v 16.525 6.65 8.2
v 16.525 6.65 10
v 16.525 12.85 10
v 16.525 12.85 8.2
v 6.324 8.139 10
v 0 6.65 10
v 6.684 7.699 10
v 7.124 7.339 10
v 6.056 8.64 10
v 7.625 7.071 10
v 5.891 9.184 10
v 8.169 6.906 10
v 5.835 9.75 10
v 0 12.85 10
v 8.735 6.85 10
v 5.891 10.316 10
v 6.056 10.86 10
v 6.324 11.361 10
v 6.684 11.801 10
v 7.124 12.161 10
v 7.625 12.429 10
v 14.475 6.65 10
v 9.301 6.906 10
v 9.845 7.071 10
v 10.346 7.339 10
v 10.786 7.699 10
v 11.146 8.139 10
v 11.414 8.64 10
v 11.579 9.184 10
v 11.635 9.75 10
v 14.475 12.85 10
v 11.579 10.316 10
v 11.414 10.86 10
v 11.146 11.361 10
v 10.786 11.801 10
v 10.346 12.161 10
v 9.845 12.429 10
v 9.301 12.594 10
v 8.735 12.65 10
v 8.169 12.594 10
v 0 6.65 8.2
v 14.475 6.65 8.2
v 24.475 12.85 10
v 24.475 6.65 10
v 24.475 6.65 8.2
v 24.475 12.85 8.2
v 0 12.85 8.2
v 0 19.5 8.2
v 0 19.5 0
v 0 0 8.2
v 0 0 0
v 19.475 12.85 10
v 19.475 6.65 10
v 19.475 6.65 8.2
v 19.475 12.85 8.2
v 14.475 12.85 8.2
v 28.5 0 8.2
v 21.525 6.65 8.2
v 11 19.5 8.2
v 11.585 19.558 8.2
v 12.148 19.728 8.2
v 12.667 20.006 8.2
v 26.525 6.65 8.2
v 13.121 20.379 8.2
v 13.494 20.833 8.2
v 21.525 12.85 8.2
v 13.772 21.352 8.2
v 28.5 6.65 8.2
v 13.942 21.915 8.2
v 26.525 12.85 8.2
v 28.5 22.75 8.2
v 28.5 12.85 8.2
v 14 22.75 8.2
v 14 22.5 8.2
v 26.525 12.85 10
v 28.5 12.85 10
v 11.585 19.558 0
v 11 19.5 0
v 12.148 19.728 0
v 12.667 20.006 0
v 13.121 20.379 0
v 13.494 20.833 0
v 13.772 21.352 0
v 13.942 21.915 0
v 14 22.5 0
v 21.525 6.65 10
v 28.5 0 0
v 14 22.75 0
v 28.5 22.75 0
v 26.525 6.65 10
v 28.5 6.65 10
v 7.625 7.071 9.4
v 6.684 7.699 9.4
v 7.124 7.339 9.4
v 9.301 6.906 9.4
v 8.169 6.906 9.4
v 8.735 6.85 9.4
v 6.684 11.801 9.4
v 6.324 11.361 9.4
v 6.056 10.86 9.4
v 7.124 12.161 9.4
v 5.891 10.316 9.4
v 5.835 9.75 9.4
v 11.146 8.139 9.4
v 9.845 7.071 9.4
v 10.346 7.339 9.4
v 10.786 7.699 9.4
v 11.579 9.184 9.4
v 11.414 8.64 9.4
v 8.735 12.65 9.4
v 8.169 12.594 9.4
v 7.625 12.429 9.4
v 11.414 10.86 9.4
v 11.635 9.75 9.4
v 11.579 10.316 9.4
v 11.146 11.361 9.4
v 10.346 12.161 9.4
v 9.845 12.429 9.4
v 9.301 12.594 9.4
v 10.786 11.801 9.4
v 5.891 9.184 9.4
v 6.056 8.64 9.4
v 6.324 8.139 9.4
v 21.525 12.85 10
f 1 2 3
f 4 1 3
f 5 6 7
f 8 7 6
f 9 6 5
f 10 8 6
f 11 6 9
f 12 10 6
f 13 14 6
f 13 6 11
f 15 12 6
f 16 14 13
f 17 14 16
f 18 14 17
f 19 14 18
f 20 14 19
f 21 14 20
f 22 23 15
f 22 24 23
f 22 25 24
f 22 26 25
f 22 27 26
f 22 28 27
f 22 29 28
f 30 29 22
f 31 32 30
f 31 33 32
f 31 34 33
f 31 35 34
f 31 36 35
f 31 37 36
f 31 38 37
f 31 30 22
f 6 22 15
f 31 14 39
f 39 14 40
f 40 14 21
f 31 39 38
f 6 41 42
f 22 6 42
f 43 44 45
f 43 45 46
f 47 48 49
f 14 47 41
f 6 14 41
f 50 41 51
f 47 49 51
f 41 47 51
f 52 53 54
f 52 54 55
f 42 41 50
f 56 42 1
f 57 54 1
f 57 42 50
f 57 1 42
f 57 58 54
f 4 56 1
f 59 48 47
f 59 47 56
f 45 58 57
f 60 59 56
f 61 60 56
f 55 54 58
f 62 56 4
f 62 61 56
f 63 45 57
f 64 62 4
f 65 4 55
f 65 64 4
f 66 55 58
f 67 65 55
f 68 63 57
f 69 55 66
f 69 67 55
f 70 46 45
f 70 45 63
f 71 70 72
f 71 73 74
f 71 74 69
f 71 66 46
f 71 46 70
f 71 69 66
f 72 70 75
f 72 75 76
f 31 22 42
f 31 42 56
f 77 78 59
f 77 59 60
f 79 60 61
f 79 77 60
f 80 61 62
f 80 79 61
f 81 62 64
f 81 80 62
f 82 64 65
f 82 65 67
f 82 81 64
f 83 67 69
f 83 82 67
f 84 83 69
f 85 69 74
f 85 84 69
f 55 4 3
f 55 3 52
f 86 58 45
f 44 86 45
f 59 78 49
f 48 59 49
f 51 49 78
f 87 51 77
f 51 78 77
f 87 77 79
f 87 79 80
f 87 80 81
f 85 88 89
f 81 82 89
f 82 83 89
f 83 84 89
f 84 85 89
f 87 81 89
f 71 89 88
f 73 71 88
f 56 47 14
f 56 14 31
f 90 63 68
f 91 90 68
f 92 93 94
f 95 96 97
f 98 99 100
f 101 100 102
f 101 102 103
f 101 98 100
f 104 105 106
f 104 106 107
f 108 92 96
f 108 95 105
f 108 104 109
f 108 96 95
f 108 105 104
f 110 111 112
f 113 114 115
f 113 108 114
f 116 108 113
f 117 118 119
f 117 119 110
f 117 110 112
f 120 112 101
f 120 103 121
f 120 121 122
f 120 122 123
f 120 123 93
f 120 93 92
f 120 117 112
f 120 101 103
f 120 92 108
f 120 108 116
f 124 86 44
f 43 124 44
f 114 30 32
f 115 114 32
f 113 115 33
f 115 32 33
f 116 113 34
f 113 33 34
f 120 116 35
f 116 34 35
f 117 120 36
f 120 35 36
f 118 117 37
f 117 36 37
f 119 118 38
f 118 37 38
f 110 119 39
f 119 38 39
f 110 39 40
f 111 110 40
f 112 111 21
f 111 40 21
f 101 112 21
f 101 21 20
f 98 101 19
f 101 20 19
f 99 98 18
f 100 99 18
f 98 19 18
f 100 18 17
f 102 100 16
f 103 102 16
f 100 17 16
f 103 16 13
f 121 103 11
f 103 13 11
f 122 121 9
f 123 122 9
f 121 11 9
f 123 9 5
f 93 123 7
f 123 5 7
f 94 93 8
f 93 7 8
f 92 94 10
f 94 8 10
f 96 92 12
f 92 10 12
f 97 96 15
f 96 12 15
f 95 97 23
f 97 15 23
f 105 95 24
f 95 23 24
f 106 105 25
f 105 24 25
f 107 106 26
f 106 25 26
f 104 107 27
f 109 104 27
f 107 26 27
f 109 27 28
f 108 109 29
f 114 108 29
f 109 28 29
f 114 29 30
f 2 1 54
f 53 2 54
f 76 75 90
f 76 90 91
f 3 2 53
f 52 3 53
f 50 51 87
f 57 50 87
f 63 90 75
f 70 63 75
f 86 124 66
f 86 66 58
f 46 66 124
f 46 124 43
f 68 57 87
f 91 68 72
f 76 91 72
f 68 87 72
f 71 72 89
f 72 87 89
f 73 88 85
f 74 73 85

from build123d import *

# Parameters (mm, degrees)
PAD004_DEPTH    = 8.2
SKETCH014_W     = 28.5
SKETCH014_H     = 6.2
PAD005_DEPTH    = 1.8
SKETCH015_R     = 2.9
POCKET004_DEPTH = 0.6
SKETCH016_W     = 2.05
SKETCH016_H     = 6.2
POCKET005_DEPTH = 1.8


with BuildPart() as part:
    # Sketch013 → Pad004 (new body)
    with BuildSketch(Plane.XY):
        with BuildLine():
            Line((0, 0), (28.5, 0))
            Line((28.5, 0), (28.5, 22.75))
            Line((28.5, 22.75), (14, 22.75))
            Line((14, 22.75), (14, 22.5))
            ThreePointArc((11, 19.5), (13.12132, 20.37868), (14, 22.5))
            Line((11, 19.5), (0, 19.5))
            Line((0, 19.5), (0, 0))
        make_face()
    extrude(amount=PAD004_DEPTH)

    # Sketch014 (on Face9 of Pad004) → Pad005 (join)
    with BuildSketch(Plane.XY.offset(8.2)):
        with Locations((14.25, 9.75)):
            Rectangle(SKETCH014_W, SKETCH014_H)
    extrude(amount=PAD005_DEPTH)

    # Sketch015 (on Face11 of Pad005) → Pocket004 (cut)
    with BuildSketch(Plane.XY.offset(10)):
        with Locations((8.735056, 9.75)):
            Circle(SKETCH015_R)
    extrude(amount=-POCKET004_DEPTH, mode=Mode.SUBTRACT)

    # Sketch016 (on Face10 of Pocket004) → Pocket005 (cut)
    with BuildSketch(Plane.XY.offset(10)):
        with Locations((15.5, 9.75)):
            Rectangle(SKETCH016_W, SKETCH016_H)
        Polygon((21.525, 12.85), (21.525, 6.65), (19.475, 6.65), (19.475, 12.85), (20.5, 12.85), align=None)
        with Locations((25.5, 9.75)):
            Rectangle(SKETCH016_W, SKETCH016_H)
    extrude(amount=-POCKET005_DEPTH, mode=Mode.SUBTRACT)


solid = part.part
